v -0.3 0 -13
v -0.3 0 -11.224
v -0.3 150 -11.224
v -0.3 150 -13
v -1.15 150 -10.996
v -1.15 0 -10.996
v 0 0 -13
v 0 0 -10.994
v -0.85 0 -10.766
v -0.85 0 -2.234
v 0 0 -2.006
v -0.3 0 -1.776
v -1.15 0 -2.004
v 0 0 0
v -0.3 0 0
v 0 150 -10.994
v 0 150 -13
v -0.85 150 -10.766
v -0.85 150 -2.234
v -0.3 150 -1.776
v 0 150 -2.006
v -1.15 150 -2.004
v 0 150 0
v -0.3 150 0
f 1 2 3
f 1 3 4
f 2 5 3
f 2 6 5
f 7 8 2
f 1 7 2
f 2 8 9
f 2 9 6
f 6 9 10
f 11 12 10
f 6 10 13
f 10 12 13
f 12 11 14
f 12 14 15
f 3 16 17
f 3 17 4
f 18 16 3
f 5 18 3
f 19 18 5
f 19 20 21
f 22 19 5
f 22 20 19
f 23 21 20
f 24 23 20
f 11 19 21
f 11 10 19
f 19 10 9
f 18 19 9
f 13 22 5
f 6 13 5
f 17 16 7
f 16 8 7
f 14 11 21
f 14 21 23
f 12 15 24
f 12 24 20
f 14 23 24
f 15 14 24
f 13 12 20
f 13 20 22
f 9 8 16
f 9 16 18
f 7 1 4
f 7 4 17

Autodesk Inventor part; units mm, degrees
ref_plane "YZ Plane" through (0, 0, 0) normal (1, 0, 0) x (0, 1, 0)
ref_plane "XZ Plane" through (0, 0, 0) normal (0, 1, 0) x (-1, 0, 0)
ref_plane "XY Plane" through (0, 0, 0) normal (0, 0, 1) x (1, 0, 0)
sketch "Skizze1" plane through (0, 0, 0) normal (0, 1, 0) x (-1, 0, 0)
  line L0 (0, 0) -> (1.15, 0) construction
  line L1 (1.15, 0) -> (1.15, -13) construction
  line L2 (1.15, -13) -> (0, -13) construction
  line L3 (0, -13) -> (0, 0) construction
  line L4 (0, -6.5) -> (1.15, -6.5) construction
  line L5 (0.575, -1.85) -> (0.575, -11.15) construction
  line L6 (0.3, -1.7763) -> (1.15, -2.0041) construction
  line L7 (0.85, -2.2343) -> (0, -2.0065) construction
  line L8 (0.3, 0) -> (0.3, -1.7763)
  line L9 (0.3, -11.2237) -> (1.15, -10.9959) construction
  line L10 (0, -10.9935) -> (0.85, -10.7657) construction
  line L11 (0.3, -11.2237) -> (0.3, -13)
  line L12 (0.85, -2.2343) -> (0.85, -10.7657)
  line L13 (0, 0) -> (0.3, 0)
  line L14 (0.3, -1.7763) -> (1.15, -2.0041)
  line L15 (1.15, -10.9959) -> (0.3, -11.2237)
  line L16 (0.3, -13) -> (0, -13)
  line L17 (0, -10.9935) -> (0.85, -10.7657)
  line L18 (0.85, -2.2343) -> (0, -2.0065)
  line L19 (1.15, -2.0041) -> (1.15, -10.9959)
  line L20 (0, -2.0065) -> (0, 0)
  line L21 (0, -10.9935) -> (0, -13)
  point P0 (0.575, -6.5)
  dimension "d0" = 1.15
  dimension "d1" = 13
  dimension "d4" = 9.3
  dimension "d7" = 75
  dimension "d8" = 0.3
  dimension "d9" = 0.3
  dimension "d10" = 75
  dimension "d11" = 0.3
  dimension "d12" = 0.3
extrude "Extrusion1" add sketch "Skizze1" along normal blind 150
equation "\"Biegeradius\" = Stärke"
equation "\"BreiteBiegungsfreistellung\" = Stärke"
equation "\"TiefeBiegungsfreistellung\" = 0.5 * Stärke"
equation "\"GrößeEckenfreistellung\" = 4 * Stärke"
equation "\"MinimalRest\" = 2 * Stärke"
equation "\"Übergangsradius\" = Biegeradius"
equation "\"JacobiRadiusGröße\" = Biegeradius"
equation "\"Abstandsgröße\" = Stärke"
equation "\"Stärke\" = 0.5"
properties part number "Koffer_ankerschiene_15m"
